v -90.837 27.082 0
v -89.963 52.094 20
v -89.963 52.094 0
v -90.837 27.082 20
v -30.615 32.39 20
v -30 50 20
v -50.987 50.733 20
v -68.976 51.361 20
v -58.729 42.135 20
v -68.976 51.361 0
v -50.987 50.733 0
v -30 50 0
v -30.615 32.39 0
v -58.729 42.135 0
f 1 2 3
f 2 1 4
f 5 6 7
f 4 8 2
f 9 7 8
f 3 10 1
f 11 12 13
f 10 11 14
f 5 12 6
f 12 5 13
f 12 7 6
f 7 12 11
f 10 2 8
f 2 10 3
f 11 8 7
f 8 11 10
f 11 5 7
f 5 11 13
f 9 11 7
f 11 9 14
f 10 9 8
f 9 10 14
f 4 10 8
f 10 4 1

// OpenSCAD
translate([-30,50,0])
scale([3,3,1])
rotate([0,0,+178]) {
    difference() {
        cube([20, 20, 20]);
        translate([7, 0, -1]) {
            rotate([0,0,50]) {
                cube([30, 30, 30]);
            }
        }
        translate([13, 0, -1]) {
            rotate([0,0,50]) {
                cube([30, 30, 30]);
            }
        }
    }
}
